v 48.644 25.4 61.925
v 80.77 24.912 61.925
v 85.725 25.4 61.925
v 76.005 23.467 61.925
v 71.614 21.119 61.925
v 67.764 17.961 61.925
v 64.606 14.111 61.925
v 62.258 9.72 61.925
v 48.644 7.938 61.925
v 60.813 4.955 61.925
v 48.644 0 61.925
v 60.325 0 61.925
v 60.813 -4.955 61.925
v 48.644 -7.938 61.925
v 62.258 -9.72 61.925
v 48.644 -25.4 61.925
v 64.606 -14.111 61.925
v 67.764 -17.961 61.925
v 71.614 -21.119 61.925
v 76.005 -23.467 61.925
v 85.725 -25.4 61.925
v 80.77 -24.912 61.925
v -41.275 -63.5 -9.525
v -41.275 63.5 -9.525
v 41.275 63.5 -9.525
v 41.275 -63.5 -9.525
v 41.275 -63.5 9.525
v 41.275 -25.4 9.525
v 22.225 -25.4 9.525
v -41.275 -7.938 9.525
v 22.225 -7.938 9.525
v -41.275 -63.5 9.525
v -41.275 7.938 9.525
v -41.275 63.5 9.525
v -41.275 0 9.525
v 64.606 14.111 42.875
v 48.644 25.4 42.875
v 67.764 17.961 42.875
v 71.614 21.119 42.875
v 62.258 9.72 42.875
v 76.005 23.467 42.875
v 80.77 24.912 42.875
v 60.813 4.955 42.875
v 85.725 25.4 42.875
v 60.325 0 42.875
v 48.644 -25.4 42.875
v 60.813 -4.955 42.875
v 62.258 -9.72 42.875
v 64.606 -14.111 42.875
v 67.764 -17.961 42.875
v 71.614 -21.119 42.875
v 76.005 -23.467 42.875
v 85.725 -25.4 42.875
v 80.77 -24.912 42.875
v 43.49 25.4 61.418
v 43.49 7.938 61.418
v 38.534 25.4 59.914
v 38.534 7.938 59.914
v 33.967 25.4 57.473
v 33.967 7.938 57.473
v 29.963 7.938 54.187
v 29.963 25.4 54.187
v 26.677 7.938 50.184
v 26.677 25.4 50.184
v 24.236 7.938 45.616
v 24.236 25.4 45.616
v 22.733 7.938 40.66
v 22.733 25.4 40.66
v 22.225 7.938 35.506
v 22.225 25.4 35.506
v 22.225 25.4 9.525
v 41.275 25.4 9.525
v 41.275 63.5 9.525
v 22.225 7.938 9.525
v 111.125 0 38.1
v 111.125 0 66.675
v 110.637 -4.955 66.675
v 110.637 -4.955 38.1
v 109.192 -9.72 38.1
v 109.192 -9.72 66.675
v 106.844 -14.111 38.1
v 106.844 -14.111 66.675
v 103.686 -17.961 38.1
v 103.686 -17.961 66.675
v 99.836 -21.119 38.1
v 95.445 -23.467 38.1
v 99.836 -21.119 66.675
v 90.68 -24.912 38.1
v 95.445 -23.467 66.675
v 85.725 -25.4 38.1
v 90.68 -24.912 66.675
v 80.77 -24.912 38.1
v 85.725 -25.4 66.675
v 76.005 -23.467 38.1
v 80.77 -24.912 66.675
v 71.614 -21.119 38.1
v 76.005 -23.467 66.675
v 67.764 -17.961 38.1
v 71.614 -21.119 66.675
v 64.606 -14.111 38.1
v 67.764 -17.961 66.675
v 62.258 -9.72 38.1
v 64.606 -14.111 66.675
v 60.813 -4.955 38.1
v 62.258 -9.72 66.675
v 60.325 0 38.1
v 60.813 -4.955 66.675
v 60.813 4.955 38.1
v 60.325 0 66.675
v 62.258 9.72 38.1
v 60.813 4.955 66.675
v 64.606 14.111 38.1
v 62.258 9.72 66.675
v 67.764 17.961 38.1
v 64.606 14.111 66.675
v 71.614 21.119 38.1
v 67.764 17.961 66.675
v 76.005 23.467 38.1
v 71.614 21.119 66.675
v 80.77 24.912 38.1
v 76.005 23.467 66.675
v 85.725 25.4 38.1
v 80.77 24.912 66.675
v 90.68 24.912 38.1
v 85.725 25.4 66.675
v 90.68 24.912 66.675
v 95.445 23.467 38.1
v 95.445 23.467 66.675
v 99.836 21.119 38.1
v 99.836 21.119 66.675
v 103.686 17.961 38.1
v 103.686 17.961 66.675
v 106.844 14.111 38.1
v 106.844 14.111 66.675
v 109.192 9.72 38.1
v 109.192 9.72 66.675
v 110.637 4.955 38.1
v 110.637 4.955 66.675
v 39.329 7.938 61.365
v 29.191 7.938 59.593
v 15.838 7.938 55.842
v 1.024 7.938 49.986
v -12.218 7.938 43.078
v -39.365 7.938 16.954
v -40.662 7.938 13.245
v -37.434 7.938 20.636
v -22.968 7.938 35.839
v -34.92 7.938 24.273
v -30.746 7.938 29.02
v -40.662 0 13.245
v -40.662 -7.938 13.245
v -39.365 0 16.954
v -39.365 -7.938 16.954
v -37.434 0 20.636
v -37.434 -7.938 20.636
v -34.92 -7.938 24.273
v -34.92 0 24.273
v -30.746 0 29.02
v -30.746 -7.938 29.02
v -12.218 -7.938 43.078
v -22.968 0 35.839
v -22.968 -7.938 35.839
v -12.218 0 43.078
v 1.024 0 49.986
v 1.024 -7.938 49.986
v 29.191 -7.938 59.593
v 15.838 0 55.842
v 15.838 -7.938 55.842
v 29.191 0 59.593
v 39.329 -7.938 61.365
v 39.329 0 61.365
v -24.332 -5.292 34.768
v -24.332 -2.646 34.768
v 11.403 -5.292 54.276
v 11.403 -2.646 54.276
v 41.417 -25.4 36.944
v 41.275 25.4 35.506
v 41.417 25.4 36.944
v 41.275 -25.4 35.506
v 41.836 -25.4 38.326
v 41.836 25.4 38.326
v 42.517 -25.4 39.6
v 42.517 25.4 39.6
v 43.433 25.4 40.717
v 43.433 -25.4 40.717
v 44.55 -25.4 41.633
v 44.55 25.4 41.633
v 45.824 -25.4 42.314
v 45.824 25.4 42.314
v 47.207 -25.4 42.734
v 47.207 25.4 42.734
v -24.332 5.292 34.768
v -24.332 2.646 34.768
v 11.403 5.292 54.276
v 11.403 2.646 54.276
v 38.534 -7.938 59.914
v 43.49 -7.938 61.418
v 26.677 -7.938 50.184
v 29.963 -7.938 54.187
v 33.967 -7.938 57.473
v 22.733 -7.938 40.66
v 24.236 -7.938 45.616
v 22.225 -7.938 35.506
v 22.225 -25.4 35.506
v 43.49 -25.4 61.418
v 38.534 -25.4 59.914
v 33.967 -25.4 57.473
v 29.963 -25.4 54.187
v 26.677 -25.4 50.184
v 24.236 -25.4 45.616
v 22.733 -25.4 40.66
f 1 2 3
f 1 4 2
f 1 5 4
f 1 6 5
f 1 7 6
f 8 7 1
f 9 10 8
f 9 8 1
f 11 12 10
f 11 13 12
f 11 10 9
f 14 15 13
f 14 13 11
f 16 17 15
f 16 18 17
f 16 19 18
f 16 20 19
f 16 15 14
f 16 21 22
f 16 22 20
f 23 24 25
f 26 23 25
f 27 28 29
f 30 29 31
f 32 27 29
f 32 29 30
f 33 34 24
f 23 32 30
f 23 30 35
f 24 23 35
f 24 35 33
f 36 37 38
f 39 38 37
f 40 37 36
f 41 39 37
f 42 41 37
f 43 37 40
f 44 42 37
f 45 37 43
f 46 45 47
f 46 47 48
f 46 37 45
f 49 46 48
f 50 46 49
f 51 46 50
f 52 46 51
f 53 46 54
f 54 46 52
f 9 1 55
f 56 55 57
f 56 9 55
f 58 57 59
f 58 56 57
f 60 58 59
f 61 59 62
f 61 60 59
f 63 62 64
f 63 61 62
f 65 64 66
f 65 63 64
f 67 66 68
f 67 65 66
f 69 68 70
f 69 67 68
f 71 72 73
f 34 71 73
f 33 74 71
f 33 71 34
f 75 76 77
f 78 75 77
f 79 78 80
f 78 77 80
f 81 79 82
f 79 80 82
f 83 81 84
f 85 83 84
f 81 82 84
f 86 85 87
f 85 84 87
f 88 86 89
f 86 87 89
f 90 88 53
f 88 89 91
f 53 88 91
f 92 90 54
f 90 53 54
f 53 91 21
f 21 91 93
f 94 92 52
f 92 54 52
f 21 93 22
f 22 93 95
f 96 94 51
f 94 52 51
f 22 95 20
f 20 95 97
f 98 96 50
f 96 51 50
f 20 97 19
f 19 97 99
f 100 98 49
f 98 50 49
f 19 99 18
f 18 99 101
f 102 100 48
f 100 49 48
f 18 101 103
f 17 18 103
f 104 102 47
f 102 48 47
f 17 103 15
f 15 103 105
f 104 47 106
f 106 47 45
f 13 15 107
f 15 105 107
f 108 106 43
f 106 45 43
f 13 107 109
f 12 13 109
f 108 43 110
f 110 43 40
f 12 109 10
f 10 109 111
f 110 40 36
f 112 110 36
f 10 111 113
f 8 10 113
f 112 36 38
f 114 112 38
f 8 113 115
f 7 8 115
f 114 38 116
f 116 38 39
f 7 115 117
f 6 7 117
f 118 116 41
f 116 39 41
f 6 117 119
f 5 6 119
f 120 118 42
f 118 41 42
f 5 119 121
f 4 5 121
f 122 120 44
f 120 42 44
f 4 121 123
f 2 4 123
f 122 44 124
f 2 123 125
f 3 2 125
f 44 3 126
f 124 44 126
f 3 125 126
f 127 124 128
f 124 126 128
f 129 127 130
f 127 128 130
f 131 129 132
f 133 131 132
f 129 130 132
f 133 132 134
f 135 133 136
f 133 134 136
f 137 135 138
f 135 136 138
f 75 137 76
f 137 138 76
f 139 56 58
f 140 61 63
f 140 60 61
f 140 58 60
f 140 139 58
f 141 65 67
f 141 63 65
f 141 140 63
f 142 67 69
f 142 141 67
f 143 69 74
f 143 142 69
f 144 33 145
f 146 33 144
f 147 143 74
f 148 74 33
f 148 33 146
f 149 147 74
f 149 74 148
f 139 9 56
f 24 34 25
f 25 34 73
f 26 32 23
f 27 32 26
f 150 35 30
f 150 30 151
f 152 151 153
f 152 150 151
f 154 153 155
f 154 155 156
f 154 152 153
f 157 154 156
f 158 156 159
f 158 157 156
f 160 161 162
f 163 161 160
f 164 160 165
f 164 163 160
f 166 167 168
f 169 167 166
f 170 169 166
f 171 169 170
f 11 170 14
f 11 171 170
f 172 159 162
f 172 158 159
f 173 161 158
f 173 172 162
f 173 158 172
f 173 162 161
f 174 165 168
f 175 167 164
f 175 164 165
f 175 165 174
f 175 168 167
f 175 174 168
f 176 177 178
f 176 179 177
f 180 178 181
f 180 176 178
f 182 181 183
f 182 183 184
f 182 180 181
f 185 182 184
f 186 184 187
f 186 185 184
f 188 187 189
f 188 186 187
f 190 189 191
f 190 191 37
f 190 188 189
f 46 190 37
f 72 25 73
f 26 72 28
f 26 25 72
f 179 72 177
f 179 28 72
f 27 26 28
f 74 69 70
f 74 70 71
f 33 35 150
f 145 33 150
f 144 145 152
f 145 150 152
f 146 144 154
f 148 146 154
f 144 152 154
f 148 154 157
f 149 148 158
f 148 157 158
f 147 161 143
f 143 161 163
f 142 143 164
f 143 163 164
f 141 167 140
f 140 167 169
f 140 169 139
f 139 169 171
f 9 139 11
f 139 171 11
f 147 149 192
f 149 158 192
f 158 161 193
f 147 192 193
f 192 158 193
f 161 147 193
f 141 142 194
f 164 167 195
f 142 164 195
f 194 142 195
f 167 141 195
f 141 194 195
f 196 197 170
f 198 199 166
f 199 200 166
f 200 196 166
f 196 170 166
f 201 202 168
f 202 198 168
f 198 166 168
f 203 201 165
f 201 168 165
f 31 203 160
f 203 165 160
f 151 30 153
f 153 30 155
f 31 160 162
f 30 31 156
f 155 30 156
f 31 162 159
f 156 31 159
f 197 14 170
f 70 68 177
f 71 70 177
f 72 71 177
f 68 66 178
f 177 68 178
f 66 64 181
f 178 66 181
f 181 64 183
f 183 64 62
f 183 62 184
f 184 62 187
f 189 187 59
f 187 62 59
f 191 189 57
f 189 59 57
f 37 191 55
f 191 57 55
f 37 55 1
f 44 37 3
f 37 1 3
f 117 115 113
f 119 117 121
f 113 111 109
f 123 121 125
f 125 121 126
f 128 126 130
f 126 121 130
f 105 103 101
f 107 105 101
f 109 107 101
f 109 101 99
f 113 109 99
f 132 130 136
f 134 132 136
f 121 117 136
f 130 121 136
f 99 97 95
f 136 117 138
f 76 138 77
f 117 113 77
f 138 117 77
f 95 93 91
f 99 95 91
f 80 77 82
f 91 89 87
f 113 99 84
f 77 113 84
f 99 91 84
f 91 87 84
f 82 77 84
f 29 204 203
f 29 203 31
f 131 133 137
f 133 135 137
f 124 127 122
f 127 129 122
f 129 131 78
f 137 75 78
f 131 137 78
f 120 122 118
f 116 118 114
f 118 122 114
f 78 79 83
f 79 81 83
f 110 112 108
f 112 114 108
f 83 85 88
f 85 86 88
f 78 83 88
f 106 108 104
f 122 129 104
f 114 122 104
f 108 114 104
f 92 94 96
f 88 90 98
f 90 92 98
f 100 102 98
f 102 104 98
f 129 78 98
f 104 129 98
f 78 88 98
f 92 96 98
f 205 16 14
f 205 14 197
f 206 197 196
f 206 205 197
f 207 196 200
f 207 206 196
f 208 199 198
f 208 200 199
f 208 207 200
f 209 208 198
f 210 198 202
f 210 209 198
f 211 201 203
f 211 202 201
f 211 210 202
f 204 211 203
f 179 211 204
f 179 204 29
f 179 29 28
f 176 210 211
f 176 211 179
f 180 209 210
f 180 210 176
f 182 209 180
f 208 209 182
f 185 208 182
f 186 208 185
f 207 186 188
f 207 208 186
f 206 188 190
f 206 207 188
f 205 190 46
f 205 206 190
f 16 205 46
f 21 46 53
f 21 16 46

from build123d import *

# Parameters (mm, degrees)
F1_DEPTH = 63.5
F0_W     = 25.4
F0_H     = 19.0500000358
F2_DEPTH = 25.4
F3_DEPTH = 7.9375


with BuildPart() as f1:
    # F0 (on Front) → F1 (new body, symmetric)
    with BuildSketch(Plane.XZ):
        Polygon((-41.275, -9.525), (41.275, -9.525), (41.275, 9.525), (22.2249999642, 9.525), (-41.275, 9.525), align=None)
    extrude(amount=F1_DEPTH, both=True)

    # F0 (on Front) → F2 (join, symmetric)
    with BuildSketch(Plane.XZ):
        with Locations((73.025, 52.4002000179)):
            Rectangle(F0_W, F0_H)
        with BuildLine():
            Line((22.2249999642, 9.525), (41.275, 9.525))
            Line((41.275, 9.525), (41.275, 35.5059314692))
            ThreePointArc((41.275, 35.5059314692), (43.4334087803, 40.7167912197), (48.6442685308, 42.8752))
            Line((48.6442685308, 42.8752), (60.325, 42.8752))
            Line((60.325, 42.8752), (60.325, 61.9252000358))
            Line((60.325, 61.9252000358), (48.6442685308, 61.9252000358))
            ThreePointArc((48.6442685308, 61.9252000358), (29.9630245734, 54.1871754266), (22.2249999642, 35.5059314692))
            Line((22.2249999642, 35.5059314692), (22.2249999642, 9.525))
        make_face()
    extrude(amount=F2_DEPTH, both=True)

    # F0 (on Front) → F3 (join, symmetric)
    with BuildSketch(Plane.XZ):
        with BuildLine():
            add(Edge.make_bspline(
                [(-41.275, 9.525), (-39.4913367927, 35.5950407684), (16.4129212499, 62.2470639646), (48.6442685308, 61.9252000358)],
                knots=[0, 0, 0, 0, 104.0733194287, 104.0733194287, 104.0733194287, 104.0733194287], degree=3))
            Line((-41.275, 9.525), (22.2249999642, 9.525))
            Line((22.2249999642, 9.525), (22.2249999642, 35.5059314692))
            ThreePointArc((22.2249999642, 35.5059314692), (29.9630245734, 54.1871754266), (48.6442685308, 61.9252000358))
        make_face()
    extrude(amount=F3_DEPTH, both=True)

    # F0 (on Front) → F4 (revolve)
    with BuildSketch(Plane.XZ):
        Polygon((85.725, 66.675), (85.725, 61.9252000358), (85.725, 42.8752), (85.725, 38.1), (111.125, 38.1), (111.125, 66.675), align=None)
    revolve(axis=Axis((85.725, 0, 52.3875), (0, 0, -1)))


solid = f1.part
